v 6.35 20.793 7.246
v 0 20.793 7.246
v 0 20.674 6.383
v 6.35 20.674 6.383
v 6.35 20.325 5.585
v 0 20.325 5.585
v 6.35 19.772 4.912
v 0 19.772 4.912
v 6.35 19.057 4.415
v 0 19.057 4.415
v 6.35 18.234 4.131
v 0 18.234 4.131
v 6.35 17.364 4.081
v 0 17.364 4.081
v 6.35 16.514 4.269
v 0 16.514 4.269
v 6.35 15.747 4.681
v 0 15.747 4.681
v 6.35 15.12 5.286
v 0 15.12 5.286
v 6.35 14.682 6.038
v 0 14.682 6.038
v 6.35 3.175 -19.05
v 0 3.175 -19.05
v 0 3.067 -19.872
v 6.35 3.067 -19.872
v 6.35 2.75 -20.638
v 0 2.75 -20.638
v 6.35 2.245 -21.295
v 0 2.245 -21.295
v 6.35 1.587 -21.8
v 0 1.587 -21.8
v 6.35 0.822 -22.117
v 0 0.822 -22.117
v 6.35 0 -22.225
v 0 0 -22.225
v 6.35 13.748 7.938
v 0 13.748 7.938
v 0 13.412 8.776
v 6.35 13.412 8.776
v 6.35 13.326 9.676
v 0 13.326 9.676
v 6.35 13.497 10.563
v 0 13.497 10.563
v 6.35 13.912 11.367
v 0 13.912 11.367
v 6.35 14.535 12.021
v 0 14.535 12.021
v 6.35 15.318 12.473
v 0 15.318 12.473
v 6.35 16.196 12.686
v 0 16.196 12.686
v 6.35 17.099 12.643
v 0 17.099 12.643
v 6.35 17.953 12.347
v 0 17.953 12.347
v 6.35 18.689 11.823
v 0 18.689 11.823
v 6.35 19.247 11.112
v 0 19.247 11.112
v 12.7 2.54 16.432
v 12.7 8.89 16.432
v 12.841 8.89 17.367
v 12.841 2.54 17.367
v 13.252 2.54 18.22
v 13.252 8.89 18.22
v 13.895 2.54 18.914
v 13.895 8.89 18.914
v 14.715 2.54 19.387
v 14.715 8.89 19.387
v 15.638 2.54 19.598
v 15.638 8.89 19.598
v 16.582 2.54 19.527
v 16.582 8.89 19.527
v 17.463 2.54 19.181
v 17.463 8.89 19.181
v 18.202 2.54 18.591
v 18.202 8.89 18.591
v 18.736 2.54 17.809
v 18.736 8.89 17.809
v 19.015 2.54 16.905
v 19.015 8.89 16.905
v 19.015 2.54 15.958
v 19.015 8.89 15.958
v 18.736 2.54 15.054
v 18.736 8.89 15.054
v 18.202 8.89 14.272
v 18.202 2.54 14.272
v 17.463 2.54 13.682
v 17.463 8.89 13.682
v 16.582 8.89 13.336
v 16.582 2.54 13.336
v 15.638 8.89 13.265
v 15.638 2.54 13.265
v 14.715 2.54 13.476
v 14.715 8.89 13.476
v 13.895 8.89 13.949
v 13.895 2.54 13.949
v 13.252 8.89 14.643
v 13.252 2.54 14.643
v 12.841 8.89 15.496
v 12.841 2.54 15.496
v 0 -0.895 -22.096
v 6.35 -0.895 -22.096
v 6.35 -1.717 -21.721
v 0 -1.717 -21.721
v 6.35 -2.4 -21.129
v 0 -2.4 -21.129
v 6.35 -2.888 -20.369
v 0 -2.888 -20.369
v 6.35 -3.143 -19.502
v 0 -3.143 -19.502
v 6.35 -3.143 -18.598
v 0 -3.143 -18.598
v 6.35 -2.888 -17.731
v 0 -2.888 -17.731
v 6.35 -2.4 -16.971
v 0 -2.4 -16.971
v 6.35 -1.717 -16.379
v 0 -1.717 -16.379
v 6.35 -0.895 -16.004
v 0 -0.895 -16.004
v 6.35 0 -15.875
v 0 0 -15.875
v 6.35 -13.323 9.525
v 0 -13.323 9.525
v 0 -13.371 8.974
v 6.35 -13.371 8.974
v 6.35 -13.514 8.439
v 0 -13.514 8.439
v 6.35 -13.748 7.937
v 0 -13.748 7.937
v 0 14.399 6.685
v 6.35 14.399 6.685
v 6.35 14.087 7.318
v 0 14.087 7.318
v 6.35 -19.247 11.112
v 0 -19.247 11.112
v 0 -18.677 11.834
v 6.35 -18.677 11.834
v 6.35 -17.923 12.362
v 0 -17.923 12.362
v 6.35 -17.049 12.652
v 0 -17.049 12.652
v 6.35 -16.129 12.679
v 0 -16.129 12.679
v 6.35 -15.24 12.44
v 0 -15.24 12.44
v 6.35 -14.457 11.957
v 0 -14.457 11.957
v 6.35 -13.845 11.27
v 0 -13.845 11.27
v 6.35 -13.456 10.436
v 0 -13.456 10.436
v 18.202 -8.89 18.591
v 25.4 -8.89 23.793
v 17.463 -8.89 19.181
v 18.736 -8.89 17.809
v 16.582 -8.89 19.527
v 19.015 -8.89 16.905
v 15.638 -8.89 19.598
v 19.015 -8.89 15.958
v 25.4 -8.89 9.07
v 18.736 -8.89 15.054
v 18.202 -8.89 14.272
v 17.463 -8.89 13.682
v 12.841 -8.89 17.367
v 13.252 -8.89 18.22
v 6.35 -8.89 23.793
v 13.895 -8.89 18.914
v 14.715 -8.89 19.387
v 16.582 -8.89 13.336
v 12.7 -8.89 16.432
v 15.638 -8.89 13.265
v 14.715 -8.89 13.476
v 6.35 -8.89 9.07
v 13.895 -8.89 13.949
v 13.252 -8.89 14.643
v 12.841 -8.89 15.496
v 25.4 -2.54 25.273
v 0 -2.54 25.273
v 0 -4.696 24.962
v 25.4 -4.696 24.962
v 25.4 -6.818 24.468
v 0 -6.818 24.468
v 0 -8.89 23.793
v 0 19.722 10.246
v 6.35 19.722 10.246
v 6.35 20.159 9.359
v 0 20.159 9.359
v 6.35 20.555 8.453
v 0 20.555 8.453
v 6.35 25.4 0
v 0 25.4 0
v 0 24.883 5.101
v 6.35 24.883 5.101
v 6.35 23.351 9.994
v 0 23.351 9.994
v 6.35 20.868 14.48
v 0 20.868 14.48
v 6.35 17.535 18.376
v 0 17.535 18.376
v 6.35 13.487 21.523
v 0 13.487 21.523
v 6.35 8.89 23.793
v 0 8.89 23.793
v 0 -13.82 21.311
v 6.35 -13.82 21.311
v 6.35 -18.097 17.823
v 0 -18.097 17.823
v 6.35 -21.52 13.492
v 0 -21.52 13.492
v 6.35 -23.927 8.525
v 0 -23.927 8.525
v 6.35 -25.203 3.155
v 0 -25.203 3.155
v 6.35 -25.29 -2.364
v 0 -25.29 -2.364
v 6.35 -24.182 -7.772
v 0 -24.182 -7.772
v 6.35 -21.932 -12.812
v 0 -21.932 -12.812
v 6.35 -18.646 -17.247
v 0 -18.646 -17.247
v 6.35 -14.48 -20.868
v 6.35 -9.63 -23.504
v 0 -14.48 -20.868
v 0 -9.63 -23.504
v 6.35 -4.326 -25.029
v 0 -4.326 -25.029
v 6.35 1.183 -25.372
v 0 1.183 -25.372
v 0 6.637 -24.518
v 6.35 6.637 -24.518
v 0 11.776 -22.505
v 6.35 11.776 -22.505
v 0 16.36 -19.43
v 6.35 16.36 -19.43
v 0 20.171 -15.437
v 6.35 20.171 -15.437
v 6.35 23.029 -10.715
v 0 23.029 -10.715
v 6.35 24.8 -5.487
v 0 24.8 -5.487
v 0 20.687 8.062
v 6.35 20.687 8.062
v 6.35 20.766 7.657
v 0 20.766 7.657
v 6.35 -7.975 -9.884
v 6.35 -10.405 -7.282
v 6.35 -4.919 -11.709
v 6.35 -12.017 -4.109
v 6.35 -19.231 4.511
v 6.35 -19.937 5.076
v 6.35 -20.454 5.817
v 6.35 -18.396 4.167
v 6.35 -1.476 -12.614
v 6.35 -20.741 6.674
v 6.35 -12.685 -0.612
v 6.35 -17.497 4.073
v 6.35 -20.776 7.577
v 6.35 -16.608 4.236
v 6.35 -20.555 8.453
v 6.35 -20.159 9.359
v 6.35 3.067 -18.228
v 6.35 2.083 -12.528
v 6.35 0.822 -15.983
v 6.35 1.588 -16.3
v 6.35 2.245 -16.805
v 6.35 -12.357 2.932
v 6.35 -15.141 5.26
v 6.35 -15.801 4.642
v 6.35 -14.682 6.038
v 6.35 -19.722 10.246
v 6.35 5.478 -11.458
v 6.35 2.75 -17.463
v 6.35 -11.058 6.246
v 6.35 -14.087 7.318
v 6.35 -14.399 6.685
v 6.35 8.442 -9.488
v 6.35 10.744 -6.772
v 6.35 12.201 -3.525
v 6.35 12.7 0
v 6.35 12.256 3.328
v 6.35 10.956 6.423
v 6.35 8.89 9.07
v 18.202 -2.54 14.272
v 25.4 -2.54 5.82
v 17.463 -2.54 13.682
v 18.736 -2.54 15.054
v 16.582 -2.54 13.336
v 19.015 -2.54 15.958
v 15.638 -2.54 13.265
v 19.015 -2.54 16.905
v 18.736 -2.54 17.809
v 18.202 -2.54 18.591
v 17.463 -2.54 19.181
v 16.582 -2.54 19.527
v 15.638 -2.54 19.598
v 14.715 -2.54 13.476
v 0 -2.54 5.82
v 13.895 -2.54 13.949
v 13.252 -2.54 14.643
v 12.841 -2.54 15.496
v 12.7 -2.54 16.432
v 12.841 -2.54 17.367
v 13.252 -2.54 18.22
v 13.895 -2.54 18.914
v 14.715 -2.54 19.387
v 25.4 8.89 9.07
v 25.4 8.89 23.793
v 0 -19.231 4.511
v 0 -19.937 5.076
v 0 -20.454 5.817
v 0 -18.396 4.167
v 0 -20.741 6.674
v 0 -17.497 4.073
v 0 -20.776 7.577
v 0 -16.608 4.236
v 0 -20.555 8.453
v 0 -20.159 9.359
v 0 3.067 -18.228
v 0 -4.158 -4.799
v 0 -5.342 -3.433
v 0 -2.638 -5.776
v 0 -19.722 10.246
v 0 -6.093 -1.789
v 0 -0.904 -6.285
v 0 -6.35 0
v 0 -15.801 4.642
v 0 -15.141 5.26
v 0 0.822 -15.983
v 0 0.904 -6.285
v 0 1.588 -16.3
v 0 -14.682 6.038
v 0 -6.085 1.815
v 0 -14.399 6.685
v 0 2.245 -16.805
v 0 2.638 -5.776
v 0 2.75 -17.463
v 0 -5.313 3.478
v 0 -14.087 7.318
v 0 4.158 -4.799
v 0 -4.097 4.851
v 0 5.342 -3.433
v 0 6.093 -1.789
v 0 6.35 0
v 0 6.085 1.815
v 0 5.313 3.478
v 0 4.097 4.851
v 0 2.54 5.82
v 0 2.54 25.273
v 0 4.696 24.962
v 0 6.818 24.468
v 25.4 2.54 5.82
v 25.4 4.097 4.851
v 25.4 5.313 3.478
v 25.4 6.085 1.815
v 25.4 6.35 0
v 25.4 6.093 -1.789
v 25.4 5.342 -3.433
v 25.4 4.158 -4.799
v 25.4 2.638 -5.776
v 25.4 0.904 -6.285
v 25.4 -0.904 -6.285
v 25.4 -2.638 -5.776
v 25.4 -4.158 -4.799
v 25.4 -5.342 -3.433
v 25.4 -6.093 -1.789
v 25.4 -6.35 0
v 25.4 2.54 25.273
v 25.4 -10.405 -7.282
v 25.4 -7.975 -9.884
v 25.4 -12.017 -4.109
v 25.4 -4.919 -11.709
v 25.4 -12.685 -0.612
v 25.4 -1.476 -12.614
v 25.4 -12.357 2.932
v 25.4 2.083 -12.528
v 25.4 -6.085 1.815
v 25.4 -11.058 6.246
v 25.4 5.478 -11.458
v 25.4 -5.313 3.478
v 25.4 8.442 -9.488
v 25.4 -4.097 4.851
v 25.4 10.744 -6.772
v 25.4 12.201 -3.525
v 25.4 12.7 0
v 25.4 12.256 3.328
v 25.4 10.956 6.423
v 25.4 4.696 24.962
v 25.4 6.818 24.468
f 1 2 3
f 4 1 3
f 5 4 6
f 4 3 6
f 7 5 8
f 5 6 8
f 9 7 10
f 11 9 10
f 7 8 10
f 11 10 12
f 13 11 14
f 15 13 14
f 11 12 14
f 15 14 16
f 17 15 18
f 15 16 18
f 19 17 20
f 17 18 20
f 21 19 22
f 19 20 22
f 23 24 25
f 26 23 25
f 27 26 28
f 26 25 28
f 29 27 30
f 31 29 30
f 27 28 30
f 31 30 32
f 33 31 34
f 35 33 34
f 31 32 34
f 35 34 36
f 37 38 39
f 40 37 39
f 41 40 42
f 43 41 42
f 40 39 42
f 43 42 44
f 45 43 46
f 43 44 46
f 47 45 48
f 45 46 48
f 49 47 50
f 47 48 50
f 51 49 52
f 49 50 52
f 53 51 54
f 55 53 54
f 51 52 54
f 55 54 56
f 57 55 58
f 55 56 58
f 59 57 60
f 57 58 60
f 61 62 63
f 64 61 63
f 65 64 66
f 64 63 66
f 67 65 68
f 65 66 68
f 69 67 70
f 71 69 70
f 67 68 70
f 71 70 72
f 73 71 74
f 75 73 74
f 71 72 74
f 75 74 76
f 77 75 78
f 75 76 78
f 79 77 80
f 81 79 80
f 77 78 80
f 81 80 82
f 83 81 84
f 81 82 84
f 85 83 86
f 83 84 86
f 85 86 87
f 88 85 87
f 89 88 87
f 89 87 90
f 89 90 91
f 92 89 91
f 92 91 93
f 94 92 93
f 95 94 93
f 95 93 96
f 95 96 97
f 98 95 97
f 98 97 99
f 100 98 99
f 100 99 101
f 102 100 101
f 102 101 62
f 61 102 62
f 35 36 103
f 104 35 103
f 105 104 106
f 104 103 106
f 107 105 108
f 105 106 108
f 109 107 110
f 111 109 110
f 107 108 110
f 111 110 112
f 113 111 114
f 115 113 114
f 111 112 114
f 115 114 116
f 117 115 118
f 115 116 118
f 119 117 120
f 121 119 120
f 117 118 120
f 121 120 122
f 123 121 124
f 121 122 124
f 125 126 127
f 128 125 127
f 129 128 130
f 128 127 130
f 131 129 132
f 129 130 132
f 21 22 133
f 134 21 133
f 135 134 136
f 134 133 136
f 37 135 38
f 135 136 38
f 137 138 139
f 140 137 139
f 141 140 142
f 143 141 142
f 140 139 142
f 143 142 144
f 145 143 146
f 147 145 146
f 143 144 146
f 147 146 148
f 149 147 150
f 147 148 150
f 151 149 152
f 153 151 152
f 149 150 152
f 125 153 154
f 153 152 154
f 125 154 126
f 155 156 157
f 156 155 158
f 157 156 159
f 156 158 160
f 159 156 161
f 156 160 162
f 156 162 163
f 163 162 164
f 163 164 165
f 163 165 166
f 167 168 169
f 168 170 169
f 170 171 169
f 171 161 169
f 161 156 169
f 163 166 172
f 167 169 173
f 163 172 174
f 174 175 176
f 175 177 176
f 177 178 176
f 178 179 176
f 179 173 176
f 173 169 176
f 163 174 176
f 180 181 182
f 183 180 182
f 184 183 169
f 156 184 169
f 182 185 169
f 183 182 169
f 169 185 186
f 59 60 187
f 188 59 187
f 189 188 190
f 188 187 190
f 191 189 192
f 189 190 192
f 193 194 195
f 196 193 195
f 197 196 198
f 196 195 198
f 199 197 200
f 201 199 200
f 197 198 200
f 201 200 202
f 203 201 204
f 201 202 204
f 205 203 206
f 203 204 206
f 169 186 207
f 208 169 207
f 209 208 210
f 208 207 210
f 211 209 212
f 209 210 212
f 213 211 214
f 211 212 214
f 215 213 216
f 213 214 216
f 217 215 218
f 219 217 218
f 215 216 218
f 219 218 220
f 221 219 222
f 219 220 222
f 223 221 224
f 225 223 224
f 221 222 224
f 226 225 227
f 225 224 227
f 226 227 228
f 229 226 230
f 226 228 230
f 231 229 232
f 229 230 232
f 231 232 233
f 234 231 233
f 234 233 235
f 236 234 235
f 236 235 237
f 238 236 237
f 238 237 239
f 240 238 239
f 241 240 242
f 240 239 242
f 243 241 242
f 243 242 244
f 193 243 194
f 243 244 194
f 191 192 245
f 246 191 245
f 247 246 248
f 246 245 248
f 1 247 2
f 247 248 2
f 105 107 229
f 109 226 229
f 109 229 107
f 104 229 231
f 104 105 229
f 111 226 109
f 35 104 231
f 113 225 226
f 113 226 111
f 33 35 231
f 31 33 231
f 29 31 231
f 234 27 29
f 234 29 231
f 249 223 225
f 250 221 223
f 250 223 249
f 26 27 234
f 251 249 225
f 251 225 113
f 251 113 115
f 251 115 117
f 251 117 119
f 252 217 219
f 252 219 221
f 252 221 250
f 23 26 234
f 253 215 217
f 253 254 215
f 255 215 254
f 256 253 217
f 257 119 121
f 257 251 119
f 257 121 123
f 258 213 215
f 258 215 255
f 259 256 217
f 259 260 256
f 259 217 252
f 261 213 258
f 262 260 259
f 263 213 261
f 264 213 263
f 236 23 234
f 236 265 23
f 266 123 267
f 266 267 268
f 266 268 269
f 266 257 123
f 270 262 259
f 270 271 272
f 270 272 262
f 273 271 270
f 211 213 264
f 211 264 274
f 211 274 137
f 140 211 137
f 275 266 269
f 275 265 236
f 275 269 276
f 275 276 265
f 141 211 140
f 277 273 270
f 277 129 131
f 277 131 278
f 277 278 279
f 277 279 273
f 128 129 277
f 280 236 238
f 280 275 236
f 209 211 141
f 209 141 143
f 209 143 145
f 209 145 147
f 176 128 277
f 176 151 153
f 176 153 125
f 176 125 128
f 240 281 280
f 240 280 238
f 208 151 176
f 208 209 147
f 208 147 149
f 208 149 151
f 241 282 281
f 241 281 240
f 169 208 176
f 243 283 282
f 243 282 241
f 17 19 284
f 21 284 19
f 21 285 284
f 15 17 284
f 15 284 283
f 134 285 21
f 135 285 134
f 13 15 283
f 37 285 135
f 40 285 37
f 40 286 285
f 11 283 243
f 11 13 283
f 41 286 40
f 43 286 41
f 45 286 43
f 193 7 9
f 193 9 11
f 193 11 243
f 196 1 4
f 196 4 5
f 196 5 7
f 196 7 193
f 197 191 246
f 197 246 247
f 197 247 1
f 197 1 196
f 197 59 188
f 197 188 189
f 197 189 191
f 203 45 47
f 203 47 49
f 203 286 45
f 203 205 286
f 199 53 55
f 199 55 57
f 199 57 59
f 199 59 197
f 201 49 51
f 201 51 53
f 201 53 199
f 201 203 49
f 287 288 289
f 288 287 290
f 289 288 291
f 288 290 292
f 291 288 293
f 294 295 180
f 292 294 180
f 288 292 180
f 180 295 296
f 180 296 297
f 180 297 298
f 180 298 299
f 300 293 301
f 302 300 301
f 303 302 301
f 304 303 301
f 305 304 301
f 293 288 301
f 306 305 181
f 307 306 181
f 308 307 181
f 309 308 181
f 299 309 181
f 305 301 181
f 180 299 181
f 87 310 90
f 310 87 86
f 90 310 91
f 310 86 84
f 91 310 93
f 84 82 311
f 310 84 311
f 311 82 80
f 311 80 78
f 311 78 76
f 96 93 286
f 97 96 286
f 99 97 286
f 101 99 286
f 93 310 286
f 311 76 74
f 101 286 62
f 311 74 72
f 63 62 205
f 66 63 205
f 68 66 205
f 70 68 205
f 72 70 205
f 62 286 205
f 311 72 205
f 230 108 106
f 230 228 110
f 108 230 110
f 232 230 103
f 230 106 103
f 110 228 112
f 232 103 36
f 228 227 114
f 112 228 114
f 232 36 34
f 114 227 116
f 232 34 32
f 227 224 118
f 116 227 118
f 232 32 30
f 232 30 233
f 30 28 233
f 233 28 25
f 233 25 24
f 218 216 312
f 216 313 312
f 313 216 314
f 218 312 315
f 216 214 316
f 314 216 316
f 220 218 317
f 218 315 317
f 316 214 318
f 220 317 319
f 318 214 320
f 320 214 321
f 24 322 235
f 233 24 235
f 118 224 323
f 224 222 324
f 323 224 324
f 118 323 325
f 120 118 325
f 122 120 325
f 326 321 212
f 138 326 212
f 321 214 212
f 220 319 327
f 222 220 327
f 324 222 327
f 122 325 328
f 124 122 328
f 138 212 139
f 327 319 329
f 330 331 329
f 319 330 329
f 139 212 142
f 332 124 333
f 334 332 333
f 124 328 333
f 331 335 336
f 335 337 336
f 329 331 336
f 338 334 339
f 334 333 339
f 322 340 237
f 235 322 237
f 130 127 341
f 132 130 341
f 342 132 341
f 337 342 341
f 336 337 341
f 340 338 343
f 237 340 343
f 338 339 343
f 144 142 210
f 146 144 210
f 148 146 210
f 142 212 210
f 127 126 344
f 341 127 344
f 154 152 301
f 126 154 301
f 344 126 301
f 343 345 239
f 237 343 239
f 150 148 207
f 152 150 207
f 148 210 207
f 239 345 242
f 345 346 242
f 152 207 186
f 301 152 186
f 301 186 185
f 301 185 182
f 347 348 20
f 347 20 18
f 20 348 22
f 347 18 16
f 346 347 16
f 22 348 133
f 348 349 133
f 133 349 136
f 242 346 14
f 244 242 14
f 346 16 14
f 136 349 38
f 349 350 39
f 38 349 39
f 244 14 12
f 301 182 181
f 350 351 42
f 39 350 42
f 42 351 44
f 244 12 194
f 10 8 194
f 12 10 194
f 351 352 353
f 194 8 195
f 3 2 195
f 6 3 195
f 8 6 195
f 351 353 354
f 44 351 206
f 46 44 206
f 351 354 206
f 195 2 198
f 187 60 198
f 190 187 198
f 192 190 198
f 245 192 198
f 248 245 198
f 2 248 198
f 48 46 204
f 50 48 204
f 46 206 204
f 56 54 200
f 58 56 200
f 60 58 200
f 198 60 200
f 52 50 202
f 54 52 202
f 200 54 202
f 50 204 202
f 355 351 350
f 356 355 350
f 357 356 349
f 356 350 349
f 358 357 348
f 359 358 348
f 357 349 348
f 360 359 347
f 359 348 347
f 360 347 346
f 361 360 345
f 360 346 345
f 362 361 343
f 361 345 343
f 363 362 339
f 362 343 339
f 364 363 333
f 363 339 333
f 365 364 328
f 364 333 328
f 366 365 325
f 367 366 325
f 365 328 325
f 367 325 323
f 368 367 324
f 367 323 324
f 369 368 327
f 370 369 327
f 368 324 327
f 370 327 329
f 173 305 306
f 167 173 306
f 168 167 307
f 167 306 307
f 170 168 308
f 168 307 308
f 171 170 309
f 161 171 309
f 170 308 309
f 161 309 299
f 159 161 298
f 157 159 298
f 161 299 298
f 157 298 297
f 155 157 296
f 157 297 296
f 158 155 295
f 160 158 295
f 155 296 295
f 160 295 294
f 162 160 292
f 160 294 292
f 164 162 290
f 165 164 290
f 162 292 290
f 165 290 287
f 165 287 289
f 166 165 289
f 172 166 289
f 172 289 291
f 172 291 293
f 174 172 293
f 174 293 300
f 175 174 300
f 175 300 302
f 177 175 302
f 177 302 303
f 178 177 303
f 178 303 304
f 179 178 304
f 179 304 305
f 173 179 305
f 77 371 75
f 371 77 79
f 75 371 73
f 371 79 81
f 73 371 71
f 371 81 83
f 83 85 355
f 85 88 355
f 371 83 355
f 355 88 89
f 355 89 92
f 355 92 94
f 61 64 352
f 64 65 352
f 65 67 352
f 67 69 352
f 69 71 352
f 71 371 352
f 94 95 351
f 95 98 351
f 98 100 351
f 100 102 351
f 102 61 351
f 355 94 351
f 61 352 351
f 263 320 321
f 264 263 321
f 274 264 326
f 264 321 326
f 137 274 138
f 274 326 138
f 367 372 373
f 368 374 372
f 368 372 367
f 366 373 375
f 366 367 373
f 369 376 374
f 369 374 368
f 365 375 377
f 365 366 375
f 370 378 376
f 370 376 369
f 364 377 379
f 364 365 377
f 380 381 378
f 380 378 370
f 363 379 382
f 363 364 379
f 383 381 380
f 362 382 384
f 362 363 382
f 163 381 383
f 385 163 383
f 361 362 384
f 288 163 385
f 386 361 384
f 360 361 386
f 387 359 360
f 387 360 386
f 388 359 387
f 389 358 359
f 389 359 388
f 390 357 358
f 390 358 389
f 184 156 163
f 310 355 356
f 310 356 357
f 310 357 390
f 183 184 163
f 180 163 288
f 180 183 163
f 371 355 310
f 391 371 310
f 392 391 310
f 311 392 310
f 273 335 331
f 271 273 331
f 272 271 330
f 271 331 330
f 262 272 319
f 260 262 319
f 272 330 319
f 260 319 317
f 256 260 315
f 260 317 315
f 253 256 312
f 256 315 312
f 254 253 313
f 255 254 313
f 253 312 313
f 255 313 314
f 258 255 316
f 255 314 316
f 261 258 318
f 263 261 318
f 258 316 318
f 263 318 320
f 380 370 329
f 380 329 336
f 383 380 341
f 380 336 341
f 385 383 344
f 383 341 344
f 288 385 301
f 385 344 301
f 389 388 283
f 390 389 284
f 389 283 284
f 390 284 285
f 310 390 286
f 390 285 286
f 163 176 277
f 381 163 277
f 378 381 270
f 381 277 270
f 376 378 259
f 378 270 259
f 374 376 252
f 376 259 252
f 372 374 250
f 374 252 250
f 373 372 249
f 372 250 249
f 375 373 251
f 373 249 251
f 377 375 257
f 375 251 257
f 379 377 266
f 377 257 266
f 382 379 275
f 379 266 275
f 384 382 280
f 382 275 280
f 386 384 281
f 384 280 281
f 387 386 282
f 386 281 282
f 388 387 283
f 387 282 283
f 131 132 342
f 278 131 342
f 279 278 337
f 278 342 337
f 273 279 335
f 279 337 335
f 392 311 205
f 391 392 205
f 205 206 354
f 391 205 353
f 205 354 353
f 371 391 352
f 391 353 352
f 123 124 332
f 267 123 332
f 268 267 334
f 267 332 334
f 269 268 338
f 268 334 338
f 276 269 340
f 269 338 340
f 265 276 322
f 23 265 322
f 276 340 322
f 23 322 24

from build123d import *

# Parameters (mm, degrees)
F1_DEPTH = 6.35
F2_DEPTH = 25.4
F3_R     = 3.175
F4_DEPTH = 17.78


with BuildPart() as f1:
    # F0 (on Right) → F1 (new body)
    with BuildSketch(Plane.YZ):
        with BuildLine():
            ThreePointArc((1.85e-08, -15.875), (-13.1884011008, -8.836385087), (-14.6819263939, 6.0379352732))
            ThreePointArc((-14.6819263939, 6.0379352732), (-18.8258986856, 4.3091372138), (-20.5546969332, 8.4531094269))
            ThreePointArc((-20.5546969332, 8.4531094269), (-18.4637615858, -12.370939055), (-8.66e-08, -22.225))
            ThreePointArc((-8.66e-08, -22.225), (-3.175, -19.0499999474), (1.85e-08, -15.875))
        make_face()
        with BuildLine():
            ThreePointArc((20.7933116087, 7.2455224835), (18.2337795642, 4.1307473398), (14.6819262886, 6.0379355294))
            ThreePointArc((14.6819262886, 6.0379355294), (15.5738756389, 3.0773401802), (15.875, 0))
            ThreePointArc((15.875, 0), (11.2253201579, -11.2253201448), (1.85e-08, -15.875))
            ThreePointArc((1.85e-08, -15.875), (2.2450640368, -16.8049359763), (3.175, -19.05))
            ThreePointArc((3.175, -19.05), (2.2450639997, -21.2950640609), (-8.66e-08, -22.225))
            ThreePointArc((-8.66e-08, -22.225), (15.7154481813, -15.7154482425), (22.225, 0))
            ThreePointArc((22.225, 0), (21.803425923, 4.3082761076), (20.5546969161, 8.4531094685))
            ThreePointArc((20.5546969161, 8.4531094685), (20.7330867492, 7.8609904554), (20.7933116087, 7.2455224835))
        make_face()
        with BuildLine():
            Line((2.54, 15.6704826027), (2.54, 12.4434078933))
            ThreePointArc((2.54, 12.4434078933), (5.9587621309, 11.2153089065), (8.89, 9.0696141042))
            Line((8.89, 9.0696141042), (8.89, 13.1523201375))
            ThreePointArc((8.89, 13.1523201375), (5.8520518239, 14.7570022176), (2.54, 15.6704826027))
        make_face()
        with BuildLine():
            Line((2.54, 25.2726809025), (2.54, 23.7934423739))
            Line((2.54, 23.7934423739), (8.89, 23.7934423739))
            ThreePointArc((8.89, 23.7934423739), (5.7626609874, 24.7376583036), (2.54, 25.2726809025))
        make_face()
        with BuildLine():
            Line((-8.89, 23.7934423739), (-2.54, 23.7934423739))
            Line((-2.54, 23.7934423739), (-2.54, 25.2726809025))
            ThreePointArc((-2.54, 25.2726809025), (-5.7626609874, 24.7376583036), (-8.89, 23.7934423739))
        make_face()
        with BuildLine():
            ThreePointArc((-8.89, 9.0696141042), (-5.9587621309, 11.2153089065), (-2.54, 12.4434078933))
            Line((-2.54, 12.4434078933), (-2.54, 15.6704826027))
            ThreePointArc((-2.54, 15.6704826027), (-5.8520518239, 14.7570022176), (-8.89, 13.1523201375))
            Line((-8.89, 13.1523201375), (-8.89, 9.0696141042))
        make_face()
        with BuildLine():
            Line((-8.89, 0), (-6.35, 0))
            ThreePointArc((-6.35, 0), (-5.3127911685, 3.4780382402), (-2.54, 5.8198711326))
            Line((-2.54, 5.8198711326), (-2.54, 12.4434078933))
            ThreePointArc((-2.54, 12.4434078933), (-5.9587621309, 11.2153089065), (-8.89, 9.0696141042))
            Line((-8.89, 9.0696141042), (-8.89, 0))
        make_face()
        with BuildLine():
            Line((8.89, 0), (6.35, 0))
            ThreePointArc((6.35, 0), (0, -6.35), (-6.35, 0))
            Line((-6.35, 0), (-8.89, 0))
            Line((-8.89, 0), (-8.89, 9.0696141042))
            ThreePointArc((-8.89, 9.0696141042), (-4.9186888497, -11.7088214608), (12.7, 0))
            ThreePointArc((12.7, 0), (11.7088214608, 4.9186888497), (8.89, 9.0696141042))
            Line((8.89, 9.0696141042), (8.89, 0))
        make_face()
        with BuildLine():
            ThreePointArc((2.54, 5.8198711326), (5.3127911685, 3.4780382402), (6.35, 0))
            Line((6.35, 0), (8.89, 0))
            Line((8.89, 0), (8.89, 9.0696141042))
            ThreePointArc((8.89, 9.0696141042), (5.9587621309, 11.2153089065), (2.54, 12.4434078933))
            Line((2.54, 12.4434078933), (2.54, 5.8198711326))
        make_face()
        with BuildLine():
            ThreePointArc((-13.7481533134, 7.937499951), (-11.6155104819, 10.8210693208), (-8.89, 13.1523201375))
            Line((-8.89, 13.1523201375), (-8.89, 20.3695489641))
            ThreePointArc((-8.89, 20.3695489641), (-14.8105289031, 16.5710246699), (-19.247414709, 11.1124998097))
            ThreePointArc((-19.247414709, 11.1124998097), (-15.67603358, 12.5918145269), (-13.3227839421, 9.525))
            ThreePointArc((-13.3227839421, 9.525), (-13.4309694509, 8.7032495045), (-13.7481533134, 7.937499951))
        make_face()
        with BuildLine():
            Line((8.89, 13.1523201375), (8.89, 9.0696141042))
            ThreePointArc((8.89, 9.0696141042), (11.7088214608, 4.9186888497), (12.7, 0))
            ThreePointArc((12.7, 0), (-4.9186888497, -11.7088214608), (-8.89, 9.0696141042))
            Line((-8.89, 9.0696141042), (-8.89, 13.1523201375))
            ThreePointArc((-8.89, 13.1523201375), (-11.6155104819, 10.8210693208), (-13.7481533134, 7.937499951))
            ThreePointArc((-13.7481533134, 7.937499951), (-14.2467345217, 7.003297828), (-14.6819263939, 6.0379352732))
            ThreePointArc((-14.6819263939, 6.0379352732), (-13.1884011008, -8.836385087), (1.85e-08, -15.875))
            ThreePointArc((1.85e-08, -15.875), (11.2253201579, -11.2253201448), (15.875, 0))
            ThreePointArc((15.875, 0), (15.5738756389, 3.0773401802), (14.6819262886, 6.0379355294))
            ThreePointArc((14.6819262886, 6.0379355294), (14.2467344349, 7.0032980045), (13.7481532552, 7.9375000518))
            ThreePointArc((13.7481532552, 7.9375000518), (11.6155104422, 10.8210693634), (8.89, 13.1523201375))
        make_face()
        with BuildLine():
            Line((8.89, 23.7934423739), (8.89, 20.3695489641))
            ThreePointArc((8.89, 20.3695489641), (14.8105289204, 16.5710246545), (19.2474147322, 11.1124997695))
            ThreePointArc((19.2474147322, 11.1124997695), (19.9454283511, 9.804616917), (20.5546969161, 8.4531094685))
            ThreePointArc((20.5546969161, 8.4531094685), (21.803425923, 4.3082761076), (22.225, 0))
            ThreePointArc((22.225, 0), (15.7154481813, -15.7154482425), (-8.66e-08, -22.225))
            ThreePointArc((-8.66e-08, -22.225), (-18.4637615858, -12.370939055), (-20.5546969332, 8.4531094269))
            ThreePointArc((-20.5546969332, 8.4531094269), (-19.9454283508, 9.8046169177), (-19.247414709, 11.1124998097))
            ThreePointArc((-19.247414709, 11.1124998097), (-14.8105289031, 16.5710246699), (-8.89, 20.3695489641))
            Line((-8.89, 20.3695489641), (-8.89, 23.7934423739))
            ThreePointArc((-8.89, 23.7934423739), (-14.4802278988, -20.8682294409), (25.4, 0))
            ThreePointArc((25.4, 0), (20.8682294409, 14.4802278988), (8.89, 23.7934423739))
        make_face()
        with BuildLine():
            ThreePointArc((-8.89, 20.3695489641), (-5.7785902794, 21.4606271899), (-2.54, 22.0793800864))
            Line((-2.54, 22.0793800864), (-2.54, 23.7934423739))
            Line((-2.54, 23.7934423739), (-8.89, 23.7934423739))
            Line((-8.89, 23.7934423739), (-8.89, 20.3695489641))
        make_face()
        with BuildLine():
            ThreePointArc((-8.89, 13.1523201375), (-5.8520518239, 14.7570022176), (-2.54, 15.6704826027))
            Line((-2.54, 15.6704826027), (-2.54, 22.0793800864))
            ThreePointArc((-2.54, 22.0793800864), (-5.7785902794, 21.4606271899), (-8.89, 20.3695489641))
            Line((-8.89, 20.3695489641), (-8.89, 13.1523201375))
        make_face()
        with BuildLine():
            Line((2.54, 22.0793800864), (2.54, 15.6704826027))
            ThreePointArc((2.54, 15.6704826027), (5.8520518239, 14.7570022176), (8.89, 13.1523201375))
            Line((8.89, 13.1523201375), (8.89, 20.3695489641))
            ThreePointArc((8.89, 20.3695489641), (5.7785902794, 21.4606271899), (2.54, 22.0793800864))
        make_face()
        with BuildLine():
            Line((2.54, 23.7934423739), (2.54, 22.0793800864))
            ThreePointArc((2.54, 22.0793800864), (5.7785902794, 21.4606271899), (8.89, 20.3695489641))
            Line((8.89, 20.3695489641), (8.89, 23.7934423739))
            Line((8.89, 23.7934423739), (2.54, 23.7934423739))
        make_face()
        with BuildLine():
            Line((8.89, 20.3695489641), (8.89, 13.1523201375))
            ThreePointArc((8.89, 13.1523201375), (11.6155104422, 10.8210693634), (13.7481532552, 7.9375000518))
            ThreePointArc((13.7481532552, 7.9375000518), (14.9102840832, 12.2746307385), (19.2474147322, 11.1124997695))
            ThreePointArc((19.2474147322, 11.1124997695), (14.8105289204, 16.5710246545), (8.89, 20.3695489641))
        make_face()
    extrude(amount=F1_DEPTH)

    # F0 (on Right) → F2 (join)
    with BuildSketch(Plane.YZ):
        with BuildLine():
            ThreePointArc((2.54, 5.8198711326), (5.3127911685, 3.4780382402), (6.35, 0))
            Line((6.35, 0), (8.89, 0))
            Line((8.89, 0), (8.89, 9.0696141042))
            ThreePointArc((8.89, 9.0696141042), (5.9587621309, 11.2153089065), (2.54, 12.4434078933))
            Line((2.54, 12.4434078933), (2.54, 5.8198711326))
        make_face()
        with BuildLine():
            Line((2.54, 15.6704826027), (2.54, 12.4434078933))
            ThreePointArc((2.54, 12.4434078933), (5.9587621309, 11.2153089065), (8.89, 9.0696141042))
            Line((8.89, 9.0696141042), (8.89, 13.1523201375))
            ThreePointArc((8.89, 13.1523201375), (5.8520518239, 14.7570022176), (2.54, 15.6704826027))
        make_face()
        with BuildLine():
            ThreePointArc((-8.89, 9.0696141042), (-5.9587621309, 11.2153089065), (-2.54, 12.4434078933))
            Line((-2.54, 12.4434078933), (-2.54, 15.6704826027))
            ThreePointArc((-2.54, 15.6704826027), (-5.8520518239, 14.7570022176), (-8.89, 13.1523201375))
            Line((-8.89, 13.1523201375), (-8.89, 9.0696141042))
        make_face()
        with BuildLine():
            Line((-8.89, 0), (-6.35, 0))
            ThreePointArc((-6.35, 0), (-5.3127911685, 3.4780382402), (-2.54, 5.8198711326))
            Line((-2.54, 5.8198711326), (-2.54, 12.4434078933))
            ThreePointArc((-2.54, 12.4434078933), (-5.9587621309, 11.2153089065), (-8.89, 9.0696141042))
            Line((-8.89, 9.0696141042), (-8.89, 0))
        make_face()
        with BuildLine():
            Line((8.89, 0), (6.35, 0))
            ThreePointArc((6.35, 0), (0, -6.35), (-6.35, 0))
            Line((-6.35, 0), (-8.89, 0))
            Line((-8.89, 0), (-8.89, 9.0696141042))
            ThreePointArc((-8.89, 9.0696141042), (-4.9186888497, -11.7088214608), (12.7, 0))
            ThreePointArc((12.7, 0), (11.7088214608, 4.9186888497), (8.89, 9.0696141042))
            Line((8.89, 9.0696141042), (8.89, 0))
        make_face()
        with BuildLine():
            Line((-8.89, 23.7934423739), (-2.54, 23.7934423739))
            Line((-2.54, 23.7934423739), (-2.54, 25.2726809025))
            ThreePointArc((-2.54, 25.2726809025), (-5.7626609874, 24.7376583036), (-8.89, 23.7934423739))
        make_face()
        with BuildLine():
            Line((2.54, 25.2726809025), (2.54, 23.7934423739))
            Line((2.54, 23.7934423739), (8.89, 23.7934423739))
            ThreePointArc((8.89, 23.7934423739), (5.7626609874, 24.7376583036), (2.54, 25.2726809025))
        make_face()
        with BuildLine():
            ThreePointArc((-8.89, 13.1523201375), (-5.8520518239, 14.7570022176), (-2.54, 15.6704826027))
            Line((-2.54, 15.6704826027), (-2.54, 22.0793800864))
            ThreePointArc((-2.54, 22.0793800864), (-5.7785902794, 21.4606271899), (-8.89, 20.3695489641))
            Line((-8.89, 20.3695489641), (-8.89, 13.1523201375))
        make_face()
        with BuildLine():
            ThreePointArc((-8.89, 20.3695489641), (-5.7785902794, 21.4606271899), (-2.54, 22.0793800864))
            Line((-2.54, 22.0793800864), (-2.54, 23.7934423739))
            Line((-2.54, 23.7934423739), (-8.89, 23.7934423739))
            Line((-8.89, 23.7934423739), (-8.89, 20.3695489641))
        make_face()
        with BuildLine():
            Line((2.54, 22.0793800864), (2.54, 15.6704826027))
            ThreePointArc((2.54, 15.6704826027), (5.8520518239, 14.7570022176), (8.89, 13.1523201375))
            Line((8.89, 13.1523201375), (8.89, 20.3695489641))
            ThreePointArc((8.89, 20.3695489641), (5.7785902794, 21.4606271899), (2.54, 22.0793800864))
        make_face()
        with BuildLine():
            Line((2.54, 23.7934423739), (2.54, 22.0793800864))
            ThreePointArc((2.54, 22.0793800864), (5.7785902794, 21.4606271899), (8.89, 20.3695489641))
            Line((8.89, 20.3695489641), (8.89, 23.7934423739))
            Line((8.89, 23.7934423739), (2.54, 23.7934423739))
        make_face()
    extrude(amount=F2_DEPTH)

    # F3 (on face) → F4 (cut, through all)
    with BuildSketch(Plane(origin=(0, 8.89, 0), x_dir=(-1, 0, 0), z_dir=(0, 1, 0))):
        with Locations((-15.875, 16.4315282391)):
            Circle(F3_R)
    extrude(amount=-F4_DEPTH, mode=Mode.SUBTRACT)


solid = f1.part
